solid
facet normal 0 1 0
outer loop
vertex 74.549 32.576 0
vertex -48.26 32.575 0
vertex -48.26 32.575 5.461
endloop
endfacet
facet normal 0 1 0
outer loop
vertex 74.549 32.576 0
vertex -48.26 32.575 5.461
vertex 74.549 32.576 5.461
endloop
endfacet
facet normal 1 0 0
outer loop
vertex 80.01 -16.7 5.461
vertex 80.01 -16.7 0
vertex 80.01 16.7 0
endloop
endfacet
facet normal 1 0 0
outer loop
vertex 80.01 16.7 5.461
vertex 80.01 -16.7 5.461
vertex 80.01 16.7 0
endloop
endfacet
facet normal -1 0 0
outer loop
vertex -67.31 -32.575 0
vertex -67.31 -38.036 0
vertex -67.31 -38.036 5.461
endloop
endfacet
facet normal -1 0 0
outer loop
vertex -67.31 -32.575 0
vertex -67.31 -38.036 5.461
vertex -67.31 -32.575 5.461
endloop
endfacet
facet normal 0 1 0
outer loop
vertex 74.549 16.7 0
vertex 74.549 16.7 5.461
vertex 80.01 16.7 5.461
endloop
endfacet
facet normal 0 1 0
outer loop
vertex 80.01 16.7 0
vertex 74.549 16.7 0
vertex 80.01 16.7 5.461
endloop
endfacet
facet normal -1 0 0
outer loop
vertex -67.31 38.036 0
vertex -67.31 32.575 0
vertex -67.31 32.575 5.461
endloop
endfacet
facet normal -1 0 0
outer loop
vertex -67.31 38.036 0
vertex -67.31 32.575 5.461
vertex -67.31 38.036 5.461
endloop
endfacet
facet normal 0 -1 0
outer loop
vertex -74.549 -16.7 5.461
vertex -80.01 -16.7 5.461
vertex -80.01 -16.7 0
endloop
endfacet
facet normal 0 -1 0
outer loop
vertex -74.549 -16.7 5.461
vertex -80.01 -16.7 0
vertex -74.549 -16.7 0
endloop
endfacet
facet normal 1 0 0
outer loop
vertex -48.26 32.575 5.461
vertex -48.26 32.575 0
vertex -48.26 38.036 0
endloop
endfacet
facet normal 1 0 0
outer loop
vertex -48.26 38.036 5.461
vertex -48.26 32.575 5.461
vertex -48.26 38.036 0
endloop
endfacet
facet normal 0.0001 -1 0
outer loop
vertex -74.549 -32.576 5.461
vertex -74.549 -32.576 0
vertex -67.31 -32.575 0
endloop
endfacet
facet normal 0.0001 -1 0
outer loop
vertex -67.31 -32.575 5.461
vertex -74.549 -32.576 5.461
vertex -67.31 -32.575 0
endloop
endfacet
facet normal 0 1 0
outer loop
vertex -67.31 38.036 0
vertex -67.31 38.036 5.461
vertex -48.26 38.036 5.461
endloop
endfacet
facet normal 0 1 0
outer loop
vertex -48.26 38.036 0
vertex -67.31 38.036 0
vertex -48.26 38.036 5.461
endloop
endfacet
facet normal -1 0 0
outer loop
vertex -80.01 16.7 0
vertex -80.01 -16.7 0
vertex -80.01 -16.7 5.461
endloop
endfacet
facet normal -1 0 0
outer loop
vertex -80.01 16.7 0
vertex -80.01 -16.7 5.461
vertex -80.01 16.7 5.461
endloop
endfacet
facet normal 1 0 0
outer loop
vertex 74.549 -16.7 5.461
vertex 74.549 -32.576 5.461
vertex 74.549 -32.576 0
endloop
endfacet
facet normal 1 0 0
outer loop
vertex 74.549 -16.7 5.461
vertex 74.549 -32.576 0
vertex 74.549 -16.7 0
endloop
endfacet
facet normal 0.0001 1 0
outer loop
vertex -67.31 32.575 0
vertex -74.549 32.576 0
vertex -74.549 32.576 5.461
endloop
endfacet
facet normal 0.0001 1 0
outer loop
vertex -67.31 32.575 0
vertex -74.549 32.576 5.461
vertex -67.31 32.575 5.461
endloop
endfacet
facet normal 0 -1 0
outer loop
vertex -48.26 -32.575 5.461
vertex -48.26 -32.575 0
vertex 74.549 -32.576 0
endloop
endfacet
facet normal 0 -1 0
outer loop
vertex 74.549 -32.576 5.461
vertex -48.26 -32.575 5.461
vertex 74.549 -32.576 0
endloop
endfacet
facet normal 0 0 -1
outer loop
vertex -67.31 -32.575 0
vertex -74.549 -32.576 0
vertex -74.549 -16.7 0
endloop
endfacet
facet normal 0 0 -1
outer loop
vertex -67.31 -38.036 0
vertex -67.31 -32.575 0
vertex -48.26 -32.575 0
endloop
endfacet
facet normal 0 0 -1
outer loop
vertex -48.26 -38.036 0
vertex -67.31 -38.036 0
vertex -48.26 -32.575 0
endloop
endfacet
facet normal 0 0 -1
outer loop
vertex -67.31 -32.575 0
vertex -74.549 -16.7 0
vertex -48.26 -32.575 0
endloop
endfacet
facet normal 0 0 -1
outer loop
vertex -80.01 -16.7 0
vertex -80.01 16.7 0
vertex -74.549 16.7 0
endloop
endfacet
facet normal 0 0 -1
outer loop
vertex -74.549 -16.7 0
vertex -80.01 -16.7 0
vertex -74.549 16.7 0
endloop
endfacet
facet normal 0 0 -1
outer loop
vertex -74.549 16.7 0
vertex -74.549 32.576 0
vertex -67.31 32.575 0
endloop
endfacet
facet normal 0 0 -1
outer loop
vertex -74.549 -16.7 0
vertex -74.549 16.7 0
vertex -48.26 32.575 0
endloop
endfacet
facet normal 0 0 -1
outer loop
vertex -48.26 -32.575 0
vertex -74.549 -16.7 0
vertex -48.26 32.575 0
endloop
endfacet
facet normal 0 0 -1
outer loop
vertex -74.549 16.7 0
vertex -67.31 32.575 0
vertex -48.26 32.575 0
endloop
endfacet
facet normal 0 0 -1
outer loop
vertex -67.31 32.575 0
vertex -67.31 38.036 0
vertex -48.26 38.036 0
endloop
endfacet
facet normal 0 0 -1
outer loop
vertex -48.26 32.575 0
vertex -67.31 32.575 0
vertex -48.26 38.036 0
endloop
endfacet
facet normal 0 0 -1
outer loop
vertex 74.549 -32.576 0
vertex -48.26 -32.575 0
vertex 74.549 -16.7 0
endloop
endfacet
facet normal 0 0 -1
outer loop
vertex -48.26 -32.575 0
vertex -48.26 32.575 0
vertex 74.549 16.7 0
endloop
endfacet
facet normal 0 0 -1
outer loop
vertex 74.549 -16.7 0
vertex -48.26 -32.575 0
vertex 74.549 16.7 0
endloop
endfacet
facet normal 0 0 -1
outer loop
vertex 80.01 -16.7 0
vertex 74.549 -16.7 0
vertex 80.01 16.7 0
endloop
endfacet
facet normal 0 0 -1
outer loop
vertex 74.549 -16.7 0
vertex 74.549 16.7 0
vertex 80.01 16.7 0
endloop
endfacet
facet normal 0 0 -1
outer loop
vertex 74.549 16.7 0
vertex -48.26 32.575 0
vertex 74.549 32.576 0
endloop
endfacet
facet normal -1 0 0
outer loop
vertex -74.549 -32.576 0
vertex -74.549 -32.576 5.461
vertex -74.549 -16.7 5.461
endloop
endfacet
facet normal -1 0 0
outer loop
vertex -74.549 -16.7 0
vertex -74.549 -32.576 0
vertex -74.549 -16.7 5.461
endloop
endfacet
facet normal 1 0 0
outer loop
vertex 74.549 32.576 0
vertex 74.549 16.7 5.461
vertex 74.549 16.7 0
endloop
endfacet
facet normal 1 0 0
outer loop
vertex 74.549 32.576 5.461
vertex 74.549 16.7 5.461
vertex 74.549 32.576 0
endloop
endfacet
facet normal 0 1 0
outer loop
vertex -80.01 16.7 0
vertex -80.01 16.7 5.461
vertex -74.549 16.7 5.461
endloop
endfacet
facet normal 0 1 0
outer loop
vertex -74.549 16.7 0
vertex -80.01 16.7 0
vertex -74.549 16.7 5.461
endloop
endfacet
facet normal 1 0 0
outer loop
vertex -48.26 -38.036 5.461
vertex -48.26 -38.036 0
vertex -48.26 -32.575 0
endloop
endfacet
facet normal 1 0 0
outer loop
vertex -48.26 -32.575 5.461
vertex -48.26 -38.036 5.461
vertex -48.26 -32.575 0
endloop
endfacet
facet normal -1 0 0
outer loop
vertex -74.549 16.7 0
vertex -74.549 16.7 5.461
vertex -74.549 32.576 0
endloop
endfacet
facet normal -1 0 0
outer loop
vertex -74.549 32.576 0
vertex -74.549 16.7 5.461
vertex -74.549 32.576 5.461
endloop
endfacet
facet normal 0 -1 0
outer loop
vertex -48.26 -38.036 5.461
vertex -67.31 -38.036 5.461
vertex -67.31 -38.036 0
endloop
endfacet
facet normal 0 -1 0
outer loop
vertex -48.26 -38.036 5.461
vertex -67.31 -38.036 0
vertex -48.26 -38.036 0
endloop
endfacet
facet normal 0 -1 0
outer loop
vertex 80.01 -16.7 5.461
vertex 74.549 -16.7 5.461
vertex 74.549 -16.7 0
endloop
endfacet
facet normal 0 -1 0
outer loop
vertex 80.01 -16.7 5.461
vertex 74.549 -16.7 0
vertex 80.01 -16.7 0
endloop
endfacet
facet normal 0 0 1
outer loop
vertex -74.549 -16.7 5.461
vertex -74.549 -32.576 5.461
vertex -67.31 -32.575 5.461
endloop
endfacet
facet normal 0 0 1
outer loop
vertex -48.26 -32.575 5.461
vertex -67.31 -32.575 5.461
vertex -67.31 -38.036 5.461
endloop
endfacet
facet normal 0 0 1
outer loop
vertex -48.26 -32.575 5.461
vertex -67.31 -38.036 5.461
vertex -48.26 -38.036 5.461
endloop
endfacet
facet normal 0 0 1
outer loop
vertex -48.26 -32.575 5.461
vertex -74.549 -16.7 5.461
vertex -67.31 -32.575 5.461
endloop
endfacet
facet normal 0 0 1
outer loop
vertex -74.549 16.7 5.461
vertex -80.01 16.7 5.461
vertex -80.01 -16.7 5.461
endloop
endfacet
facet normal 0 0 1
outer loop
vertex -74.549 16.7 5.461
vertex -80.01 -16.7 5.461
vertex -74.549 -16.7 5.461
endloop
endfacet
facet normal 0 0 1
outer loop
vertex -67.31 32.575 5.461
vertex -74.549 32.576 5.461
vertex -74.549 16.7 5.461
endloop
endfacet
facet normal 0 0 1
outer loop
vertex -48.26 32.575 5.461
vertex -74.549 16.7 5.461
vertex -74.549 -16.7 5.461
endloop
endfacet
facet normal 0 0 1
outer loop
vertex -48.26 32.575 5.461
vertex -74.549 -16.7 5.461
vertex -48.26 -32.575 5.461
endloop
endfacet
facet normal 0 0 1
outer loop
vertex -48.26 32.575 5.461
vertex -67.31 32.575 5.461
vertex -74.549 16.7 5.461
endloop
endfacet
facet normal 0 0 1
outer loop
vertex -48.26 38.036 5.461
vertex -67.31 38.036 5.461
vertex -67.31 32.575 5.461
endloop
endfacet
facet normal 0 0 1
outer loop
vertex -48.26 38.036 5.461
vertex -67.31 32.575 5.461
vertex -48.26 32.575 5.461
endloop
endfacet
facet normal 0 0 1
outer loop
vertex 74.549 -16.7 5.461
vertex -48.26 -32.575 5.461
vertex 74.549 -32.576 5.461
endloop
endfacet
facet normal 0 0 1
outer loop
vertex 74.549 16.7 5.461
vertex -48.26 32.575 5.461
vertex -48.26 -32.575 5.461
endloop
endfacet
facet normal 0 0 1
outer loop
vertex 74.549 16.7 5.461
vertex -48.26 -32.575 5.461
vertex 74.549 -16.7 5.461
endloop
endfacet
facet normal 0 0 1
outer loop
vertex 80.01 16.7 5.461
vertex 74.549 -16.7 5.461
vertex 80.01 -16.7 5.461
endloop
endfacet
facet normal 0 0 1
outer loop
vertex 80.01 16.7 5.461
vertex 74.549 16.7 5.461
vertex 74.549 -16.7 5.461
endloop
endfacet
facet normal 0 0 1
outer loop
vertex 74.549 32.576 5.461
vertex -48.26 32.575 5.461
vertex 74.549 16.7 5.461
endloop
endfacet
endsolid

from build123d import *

# Parameters (mm, degrees)
SKETCH1_W           = 160.02
SKETCH1_H           = 65.151
BOSS_EXTRUDE1_DEPTH = 5.461
SKETCH2_W           = 5.461
SKETCH2_H           = 15.875
CUT_EXTRUDE1_DEPTH  = 6.461
SKETCH4_W           = 19.05
SKETCH4_H           = 5.461
BOSS_EXTRUDE3_DEPTH = 5.461


with BuildPart() as part:
    # Sketch1 → Boss-Extrude1 (new body)
    with BuildSketch(Plane.XY):
        Rectangle(SKETCH1_W, SKETCH1_H)
    extrude(amount=BOSS_EXTRUDE1_DEPTH)

    # Sketch2 → Cut-Extrude1 (cut, through all)
    with BuildSketch(Plane.XY.offset(5.461)):
        with Locations((-77.2795, 24.638)):
            Rectangle(SKETCH2_W, SKETCH2_H)
        with Locations((-77.2795, -24.638)):
            Rectangle(SKETCH2_W, SKETCH2_H)
        with Locations((77.2795, 24.638)):
            Rectangle(SKETCH2_W, SKETCH2_H)
        with Locations((77.2795, -24.638)):
            Rectangle(SKETCH2_W, SKETCH2_H)
    extrude(amount=-CUT_EXTRUDE1_DEPTH, mode=Mode.SUBTRACT)

    # Sketch4 → Boss-Extrude3 (add)
    with BuildSketch(Plane.XY.offset(5.461)):
        with Locations((-57.785, 35.306)):
            Rectangle(SKETCH4_W, SKETCH4_H)
        with Locations((-57.785, -35.306)):
            Rectangle(SKETCH4_W, SKETCH4_H)
    extrude(amount=-BOSS_EXTRUDE3_DEPTH)


solid = part.part
